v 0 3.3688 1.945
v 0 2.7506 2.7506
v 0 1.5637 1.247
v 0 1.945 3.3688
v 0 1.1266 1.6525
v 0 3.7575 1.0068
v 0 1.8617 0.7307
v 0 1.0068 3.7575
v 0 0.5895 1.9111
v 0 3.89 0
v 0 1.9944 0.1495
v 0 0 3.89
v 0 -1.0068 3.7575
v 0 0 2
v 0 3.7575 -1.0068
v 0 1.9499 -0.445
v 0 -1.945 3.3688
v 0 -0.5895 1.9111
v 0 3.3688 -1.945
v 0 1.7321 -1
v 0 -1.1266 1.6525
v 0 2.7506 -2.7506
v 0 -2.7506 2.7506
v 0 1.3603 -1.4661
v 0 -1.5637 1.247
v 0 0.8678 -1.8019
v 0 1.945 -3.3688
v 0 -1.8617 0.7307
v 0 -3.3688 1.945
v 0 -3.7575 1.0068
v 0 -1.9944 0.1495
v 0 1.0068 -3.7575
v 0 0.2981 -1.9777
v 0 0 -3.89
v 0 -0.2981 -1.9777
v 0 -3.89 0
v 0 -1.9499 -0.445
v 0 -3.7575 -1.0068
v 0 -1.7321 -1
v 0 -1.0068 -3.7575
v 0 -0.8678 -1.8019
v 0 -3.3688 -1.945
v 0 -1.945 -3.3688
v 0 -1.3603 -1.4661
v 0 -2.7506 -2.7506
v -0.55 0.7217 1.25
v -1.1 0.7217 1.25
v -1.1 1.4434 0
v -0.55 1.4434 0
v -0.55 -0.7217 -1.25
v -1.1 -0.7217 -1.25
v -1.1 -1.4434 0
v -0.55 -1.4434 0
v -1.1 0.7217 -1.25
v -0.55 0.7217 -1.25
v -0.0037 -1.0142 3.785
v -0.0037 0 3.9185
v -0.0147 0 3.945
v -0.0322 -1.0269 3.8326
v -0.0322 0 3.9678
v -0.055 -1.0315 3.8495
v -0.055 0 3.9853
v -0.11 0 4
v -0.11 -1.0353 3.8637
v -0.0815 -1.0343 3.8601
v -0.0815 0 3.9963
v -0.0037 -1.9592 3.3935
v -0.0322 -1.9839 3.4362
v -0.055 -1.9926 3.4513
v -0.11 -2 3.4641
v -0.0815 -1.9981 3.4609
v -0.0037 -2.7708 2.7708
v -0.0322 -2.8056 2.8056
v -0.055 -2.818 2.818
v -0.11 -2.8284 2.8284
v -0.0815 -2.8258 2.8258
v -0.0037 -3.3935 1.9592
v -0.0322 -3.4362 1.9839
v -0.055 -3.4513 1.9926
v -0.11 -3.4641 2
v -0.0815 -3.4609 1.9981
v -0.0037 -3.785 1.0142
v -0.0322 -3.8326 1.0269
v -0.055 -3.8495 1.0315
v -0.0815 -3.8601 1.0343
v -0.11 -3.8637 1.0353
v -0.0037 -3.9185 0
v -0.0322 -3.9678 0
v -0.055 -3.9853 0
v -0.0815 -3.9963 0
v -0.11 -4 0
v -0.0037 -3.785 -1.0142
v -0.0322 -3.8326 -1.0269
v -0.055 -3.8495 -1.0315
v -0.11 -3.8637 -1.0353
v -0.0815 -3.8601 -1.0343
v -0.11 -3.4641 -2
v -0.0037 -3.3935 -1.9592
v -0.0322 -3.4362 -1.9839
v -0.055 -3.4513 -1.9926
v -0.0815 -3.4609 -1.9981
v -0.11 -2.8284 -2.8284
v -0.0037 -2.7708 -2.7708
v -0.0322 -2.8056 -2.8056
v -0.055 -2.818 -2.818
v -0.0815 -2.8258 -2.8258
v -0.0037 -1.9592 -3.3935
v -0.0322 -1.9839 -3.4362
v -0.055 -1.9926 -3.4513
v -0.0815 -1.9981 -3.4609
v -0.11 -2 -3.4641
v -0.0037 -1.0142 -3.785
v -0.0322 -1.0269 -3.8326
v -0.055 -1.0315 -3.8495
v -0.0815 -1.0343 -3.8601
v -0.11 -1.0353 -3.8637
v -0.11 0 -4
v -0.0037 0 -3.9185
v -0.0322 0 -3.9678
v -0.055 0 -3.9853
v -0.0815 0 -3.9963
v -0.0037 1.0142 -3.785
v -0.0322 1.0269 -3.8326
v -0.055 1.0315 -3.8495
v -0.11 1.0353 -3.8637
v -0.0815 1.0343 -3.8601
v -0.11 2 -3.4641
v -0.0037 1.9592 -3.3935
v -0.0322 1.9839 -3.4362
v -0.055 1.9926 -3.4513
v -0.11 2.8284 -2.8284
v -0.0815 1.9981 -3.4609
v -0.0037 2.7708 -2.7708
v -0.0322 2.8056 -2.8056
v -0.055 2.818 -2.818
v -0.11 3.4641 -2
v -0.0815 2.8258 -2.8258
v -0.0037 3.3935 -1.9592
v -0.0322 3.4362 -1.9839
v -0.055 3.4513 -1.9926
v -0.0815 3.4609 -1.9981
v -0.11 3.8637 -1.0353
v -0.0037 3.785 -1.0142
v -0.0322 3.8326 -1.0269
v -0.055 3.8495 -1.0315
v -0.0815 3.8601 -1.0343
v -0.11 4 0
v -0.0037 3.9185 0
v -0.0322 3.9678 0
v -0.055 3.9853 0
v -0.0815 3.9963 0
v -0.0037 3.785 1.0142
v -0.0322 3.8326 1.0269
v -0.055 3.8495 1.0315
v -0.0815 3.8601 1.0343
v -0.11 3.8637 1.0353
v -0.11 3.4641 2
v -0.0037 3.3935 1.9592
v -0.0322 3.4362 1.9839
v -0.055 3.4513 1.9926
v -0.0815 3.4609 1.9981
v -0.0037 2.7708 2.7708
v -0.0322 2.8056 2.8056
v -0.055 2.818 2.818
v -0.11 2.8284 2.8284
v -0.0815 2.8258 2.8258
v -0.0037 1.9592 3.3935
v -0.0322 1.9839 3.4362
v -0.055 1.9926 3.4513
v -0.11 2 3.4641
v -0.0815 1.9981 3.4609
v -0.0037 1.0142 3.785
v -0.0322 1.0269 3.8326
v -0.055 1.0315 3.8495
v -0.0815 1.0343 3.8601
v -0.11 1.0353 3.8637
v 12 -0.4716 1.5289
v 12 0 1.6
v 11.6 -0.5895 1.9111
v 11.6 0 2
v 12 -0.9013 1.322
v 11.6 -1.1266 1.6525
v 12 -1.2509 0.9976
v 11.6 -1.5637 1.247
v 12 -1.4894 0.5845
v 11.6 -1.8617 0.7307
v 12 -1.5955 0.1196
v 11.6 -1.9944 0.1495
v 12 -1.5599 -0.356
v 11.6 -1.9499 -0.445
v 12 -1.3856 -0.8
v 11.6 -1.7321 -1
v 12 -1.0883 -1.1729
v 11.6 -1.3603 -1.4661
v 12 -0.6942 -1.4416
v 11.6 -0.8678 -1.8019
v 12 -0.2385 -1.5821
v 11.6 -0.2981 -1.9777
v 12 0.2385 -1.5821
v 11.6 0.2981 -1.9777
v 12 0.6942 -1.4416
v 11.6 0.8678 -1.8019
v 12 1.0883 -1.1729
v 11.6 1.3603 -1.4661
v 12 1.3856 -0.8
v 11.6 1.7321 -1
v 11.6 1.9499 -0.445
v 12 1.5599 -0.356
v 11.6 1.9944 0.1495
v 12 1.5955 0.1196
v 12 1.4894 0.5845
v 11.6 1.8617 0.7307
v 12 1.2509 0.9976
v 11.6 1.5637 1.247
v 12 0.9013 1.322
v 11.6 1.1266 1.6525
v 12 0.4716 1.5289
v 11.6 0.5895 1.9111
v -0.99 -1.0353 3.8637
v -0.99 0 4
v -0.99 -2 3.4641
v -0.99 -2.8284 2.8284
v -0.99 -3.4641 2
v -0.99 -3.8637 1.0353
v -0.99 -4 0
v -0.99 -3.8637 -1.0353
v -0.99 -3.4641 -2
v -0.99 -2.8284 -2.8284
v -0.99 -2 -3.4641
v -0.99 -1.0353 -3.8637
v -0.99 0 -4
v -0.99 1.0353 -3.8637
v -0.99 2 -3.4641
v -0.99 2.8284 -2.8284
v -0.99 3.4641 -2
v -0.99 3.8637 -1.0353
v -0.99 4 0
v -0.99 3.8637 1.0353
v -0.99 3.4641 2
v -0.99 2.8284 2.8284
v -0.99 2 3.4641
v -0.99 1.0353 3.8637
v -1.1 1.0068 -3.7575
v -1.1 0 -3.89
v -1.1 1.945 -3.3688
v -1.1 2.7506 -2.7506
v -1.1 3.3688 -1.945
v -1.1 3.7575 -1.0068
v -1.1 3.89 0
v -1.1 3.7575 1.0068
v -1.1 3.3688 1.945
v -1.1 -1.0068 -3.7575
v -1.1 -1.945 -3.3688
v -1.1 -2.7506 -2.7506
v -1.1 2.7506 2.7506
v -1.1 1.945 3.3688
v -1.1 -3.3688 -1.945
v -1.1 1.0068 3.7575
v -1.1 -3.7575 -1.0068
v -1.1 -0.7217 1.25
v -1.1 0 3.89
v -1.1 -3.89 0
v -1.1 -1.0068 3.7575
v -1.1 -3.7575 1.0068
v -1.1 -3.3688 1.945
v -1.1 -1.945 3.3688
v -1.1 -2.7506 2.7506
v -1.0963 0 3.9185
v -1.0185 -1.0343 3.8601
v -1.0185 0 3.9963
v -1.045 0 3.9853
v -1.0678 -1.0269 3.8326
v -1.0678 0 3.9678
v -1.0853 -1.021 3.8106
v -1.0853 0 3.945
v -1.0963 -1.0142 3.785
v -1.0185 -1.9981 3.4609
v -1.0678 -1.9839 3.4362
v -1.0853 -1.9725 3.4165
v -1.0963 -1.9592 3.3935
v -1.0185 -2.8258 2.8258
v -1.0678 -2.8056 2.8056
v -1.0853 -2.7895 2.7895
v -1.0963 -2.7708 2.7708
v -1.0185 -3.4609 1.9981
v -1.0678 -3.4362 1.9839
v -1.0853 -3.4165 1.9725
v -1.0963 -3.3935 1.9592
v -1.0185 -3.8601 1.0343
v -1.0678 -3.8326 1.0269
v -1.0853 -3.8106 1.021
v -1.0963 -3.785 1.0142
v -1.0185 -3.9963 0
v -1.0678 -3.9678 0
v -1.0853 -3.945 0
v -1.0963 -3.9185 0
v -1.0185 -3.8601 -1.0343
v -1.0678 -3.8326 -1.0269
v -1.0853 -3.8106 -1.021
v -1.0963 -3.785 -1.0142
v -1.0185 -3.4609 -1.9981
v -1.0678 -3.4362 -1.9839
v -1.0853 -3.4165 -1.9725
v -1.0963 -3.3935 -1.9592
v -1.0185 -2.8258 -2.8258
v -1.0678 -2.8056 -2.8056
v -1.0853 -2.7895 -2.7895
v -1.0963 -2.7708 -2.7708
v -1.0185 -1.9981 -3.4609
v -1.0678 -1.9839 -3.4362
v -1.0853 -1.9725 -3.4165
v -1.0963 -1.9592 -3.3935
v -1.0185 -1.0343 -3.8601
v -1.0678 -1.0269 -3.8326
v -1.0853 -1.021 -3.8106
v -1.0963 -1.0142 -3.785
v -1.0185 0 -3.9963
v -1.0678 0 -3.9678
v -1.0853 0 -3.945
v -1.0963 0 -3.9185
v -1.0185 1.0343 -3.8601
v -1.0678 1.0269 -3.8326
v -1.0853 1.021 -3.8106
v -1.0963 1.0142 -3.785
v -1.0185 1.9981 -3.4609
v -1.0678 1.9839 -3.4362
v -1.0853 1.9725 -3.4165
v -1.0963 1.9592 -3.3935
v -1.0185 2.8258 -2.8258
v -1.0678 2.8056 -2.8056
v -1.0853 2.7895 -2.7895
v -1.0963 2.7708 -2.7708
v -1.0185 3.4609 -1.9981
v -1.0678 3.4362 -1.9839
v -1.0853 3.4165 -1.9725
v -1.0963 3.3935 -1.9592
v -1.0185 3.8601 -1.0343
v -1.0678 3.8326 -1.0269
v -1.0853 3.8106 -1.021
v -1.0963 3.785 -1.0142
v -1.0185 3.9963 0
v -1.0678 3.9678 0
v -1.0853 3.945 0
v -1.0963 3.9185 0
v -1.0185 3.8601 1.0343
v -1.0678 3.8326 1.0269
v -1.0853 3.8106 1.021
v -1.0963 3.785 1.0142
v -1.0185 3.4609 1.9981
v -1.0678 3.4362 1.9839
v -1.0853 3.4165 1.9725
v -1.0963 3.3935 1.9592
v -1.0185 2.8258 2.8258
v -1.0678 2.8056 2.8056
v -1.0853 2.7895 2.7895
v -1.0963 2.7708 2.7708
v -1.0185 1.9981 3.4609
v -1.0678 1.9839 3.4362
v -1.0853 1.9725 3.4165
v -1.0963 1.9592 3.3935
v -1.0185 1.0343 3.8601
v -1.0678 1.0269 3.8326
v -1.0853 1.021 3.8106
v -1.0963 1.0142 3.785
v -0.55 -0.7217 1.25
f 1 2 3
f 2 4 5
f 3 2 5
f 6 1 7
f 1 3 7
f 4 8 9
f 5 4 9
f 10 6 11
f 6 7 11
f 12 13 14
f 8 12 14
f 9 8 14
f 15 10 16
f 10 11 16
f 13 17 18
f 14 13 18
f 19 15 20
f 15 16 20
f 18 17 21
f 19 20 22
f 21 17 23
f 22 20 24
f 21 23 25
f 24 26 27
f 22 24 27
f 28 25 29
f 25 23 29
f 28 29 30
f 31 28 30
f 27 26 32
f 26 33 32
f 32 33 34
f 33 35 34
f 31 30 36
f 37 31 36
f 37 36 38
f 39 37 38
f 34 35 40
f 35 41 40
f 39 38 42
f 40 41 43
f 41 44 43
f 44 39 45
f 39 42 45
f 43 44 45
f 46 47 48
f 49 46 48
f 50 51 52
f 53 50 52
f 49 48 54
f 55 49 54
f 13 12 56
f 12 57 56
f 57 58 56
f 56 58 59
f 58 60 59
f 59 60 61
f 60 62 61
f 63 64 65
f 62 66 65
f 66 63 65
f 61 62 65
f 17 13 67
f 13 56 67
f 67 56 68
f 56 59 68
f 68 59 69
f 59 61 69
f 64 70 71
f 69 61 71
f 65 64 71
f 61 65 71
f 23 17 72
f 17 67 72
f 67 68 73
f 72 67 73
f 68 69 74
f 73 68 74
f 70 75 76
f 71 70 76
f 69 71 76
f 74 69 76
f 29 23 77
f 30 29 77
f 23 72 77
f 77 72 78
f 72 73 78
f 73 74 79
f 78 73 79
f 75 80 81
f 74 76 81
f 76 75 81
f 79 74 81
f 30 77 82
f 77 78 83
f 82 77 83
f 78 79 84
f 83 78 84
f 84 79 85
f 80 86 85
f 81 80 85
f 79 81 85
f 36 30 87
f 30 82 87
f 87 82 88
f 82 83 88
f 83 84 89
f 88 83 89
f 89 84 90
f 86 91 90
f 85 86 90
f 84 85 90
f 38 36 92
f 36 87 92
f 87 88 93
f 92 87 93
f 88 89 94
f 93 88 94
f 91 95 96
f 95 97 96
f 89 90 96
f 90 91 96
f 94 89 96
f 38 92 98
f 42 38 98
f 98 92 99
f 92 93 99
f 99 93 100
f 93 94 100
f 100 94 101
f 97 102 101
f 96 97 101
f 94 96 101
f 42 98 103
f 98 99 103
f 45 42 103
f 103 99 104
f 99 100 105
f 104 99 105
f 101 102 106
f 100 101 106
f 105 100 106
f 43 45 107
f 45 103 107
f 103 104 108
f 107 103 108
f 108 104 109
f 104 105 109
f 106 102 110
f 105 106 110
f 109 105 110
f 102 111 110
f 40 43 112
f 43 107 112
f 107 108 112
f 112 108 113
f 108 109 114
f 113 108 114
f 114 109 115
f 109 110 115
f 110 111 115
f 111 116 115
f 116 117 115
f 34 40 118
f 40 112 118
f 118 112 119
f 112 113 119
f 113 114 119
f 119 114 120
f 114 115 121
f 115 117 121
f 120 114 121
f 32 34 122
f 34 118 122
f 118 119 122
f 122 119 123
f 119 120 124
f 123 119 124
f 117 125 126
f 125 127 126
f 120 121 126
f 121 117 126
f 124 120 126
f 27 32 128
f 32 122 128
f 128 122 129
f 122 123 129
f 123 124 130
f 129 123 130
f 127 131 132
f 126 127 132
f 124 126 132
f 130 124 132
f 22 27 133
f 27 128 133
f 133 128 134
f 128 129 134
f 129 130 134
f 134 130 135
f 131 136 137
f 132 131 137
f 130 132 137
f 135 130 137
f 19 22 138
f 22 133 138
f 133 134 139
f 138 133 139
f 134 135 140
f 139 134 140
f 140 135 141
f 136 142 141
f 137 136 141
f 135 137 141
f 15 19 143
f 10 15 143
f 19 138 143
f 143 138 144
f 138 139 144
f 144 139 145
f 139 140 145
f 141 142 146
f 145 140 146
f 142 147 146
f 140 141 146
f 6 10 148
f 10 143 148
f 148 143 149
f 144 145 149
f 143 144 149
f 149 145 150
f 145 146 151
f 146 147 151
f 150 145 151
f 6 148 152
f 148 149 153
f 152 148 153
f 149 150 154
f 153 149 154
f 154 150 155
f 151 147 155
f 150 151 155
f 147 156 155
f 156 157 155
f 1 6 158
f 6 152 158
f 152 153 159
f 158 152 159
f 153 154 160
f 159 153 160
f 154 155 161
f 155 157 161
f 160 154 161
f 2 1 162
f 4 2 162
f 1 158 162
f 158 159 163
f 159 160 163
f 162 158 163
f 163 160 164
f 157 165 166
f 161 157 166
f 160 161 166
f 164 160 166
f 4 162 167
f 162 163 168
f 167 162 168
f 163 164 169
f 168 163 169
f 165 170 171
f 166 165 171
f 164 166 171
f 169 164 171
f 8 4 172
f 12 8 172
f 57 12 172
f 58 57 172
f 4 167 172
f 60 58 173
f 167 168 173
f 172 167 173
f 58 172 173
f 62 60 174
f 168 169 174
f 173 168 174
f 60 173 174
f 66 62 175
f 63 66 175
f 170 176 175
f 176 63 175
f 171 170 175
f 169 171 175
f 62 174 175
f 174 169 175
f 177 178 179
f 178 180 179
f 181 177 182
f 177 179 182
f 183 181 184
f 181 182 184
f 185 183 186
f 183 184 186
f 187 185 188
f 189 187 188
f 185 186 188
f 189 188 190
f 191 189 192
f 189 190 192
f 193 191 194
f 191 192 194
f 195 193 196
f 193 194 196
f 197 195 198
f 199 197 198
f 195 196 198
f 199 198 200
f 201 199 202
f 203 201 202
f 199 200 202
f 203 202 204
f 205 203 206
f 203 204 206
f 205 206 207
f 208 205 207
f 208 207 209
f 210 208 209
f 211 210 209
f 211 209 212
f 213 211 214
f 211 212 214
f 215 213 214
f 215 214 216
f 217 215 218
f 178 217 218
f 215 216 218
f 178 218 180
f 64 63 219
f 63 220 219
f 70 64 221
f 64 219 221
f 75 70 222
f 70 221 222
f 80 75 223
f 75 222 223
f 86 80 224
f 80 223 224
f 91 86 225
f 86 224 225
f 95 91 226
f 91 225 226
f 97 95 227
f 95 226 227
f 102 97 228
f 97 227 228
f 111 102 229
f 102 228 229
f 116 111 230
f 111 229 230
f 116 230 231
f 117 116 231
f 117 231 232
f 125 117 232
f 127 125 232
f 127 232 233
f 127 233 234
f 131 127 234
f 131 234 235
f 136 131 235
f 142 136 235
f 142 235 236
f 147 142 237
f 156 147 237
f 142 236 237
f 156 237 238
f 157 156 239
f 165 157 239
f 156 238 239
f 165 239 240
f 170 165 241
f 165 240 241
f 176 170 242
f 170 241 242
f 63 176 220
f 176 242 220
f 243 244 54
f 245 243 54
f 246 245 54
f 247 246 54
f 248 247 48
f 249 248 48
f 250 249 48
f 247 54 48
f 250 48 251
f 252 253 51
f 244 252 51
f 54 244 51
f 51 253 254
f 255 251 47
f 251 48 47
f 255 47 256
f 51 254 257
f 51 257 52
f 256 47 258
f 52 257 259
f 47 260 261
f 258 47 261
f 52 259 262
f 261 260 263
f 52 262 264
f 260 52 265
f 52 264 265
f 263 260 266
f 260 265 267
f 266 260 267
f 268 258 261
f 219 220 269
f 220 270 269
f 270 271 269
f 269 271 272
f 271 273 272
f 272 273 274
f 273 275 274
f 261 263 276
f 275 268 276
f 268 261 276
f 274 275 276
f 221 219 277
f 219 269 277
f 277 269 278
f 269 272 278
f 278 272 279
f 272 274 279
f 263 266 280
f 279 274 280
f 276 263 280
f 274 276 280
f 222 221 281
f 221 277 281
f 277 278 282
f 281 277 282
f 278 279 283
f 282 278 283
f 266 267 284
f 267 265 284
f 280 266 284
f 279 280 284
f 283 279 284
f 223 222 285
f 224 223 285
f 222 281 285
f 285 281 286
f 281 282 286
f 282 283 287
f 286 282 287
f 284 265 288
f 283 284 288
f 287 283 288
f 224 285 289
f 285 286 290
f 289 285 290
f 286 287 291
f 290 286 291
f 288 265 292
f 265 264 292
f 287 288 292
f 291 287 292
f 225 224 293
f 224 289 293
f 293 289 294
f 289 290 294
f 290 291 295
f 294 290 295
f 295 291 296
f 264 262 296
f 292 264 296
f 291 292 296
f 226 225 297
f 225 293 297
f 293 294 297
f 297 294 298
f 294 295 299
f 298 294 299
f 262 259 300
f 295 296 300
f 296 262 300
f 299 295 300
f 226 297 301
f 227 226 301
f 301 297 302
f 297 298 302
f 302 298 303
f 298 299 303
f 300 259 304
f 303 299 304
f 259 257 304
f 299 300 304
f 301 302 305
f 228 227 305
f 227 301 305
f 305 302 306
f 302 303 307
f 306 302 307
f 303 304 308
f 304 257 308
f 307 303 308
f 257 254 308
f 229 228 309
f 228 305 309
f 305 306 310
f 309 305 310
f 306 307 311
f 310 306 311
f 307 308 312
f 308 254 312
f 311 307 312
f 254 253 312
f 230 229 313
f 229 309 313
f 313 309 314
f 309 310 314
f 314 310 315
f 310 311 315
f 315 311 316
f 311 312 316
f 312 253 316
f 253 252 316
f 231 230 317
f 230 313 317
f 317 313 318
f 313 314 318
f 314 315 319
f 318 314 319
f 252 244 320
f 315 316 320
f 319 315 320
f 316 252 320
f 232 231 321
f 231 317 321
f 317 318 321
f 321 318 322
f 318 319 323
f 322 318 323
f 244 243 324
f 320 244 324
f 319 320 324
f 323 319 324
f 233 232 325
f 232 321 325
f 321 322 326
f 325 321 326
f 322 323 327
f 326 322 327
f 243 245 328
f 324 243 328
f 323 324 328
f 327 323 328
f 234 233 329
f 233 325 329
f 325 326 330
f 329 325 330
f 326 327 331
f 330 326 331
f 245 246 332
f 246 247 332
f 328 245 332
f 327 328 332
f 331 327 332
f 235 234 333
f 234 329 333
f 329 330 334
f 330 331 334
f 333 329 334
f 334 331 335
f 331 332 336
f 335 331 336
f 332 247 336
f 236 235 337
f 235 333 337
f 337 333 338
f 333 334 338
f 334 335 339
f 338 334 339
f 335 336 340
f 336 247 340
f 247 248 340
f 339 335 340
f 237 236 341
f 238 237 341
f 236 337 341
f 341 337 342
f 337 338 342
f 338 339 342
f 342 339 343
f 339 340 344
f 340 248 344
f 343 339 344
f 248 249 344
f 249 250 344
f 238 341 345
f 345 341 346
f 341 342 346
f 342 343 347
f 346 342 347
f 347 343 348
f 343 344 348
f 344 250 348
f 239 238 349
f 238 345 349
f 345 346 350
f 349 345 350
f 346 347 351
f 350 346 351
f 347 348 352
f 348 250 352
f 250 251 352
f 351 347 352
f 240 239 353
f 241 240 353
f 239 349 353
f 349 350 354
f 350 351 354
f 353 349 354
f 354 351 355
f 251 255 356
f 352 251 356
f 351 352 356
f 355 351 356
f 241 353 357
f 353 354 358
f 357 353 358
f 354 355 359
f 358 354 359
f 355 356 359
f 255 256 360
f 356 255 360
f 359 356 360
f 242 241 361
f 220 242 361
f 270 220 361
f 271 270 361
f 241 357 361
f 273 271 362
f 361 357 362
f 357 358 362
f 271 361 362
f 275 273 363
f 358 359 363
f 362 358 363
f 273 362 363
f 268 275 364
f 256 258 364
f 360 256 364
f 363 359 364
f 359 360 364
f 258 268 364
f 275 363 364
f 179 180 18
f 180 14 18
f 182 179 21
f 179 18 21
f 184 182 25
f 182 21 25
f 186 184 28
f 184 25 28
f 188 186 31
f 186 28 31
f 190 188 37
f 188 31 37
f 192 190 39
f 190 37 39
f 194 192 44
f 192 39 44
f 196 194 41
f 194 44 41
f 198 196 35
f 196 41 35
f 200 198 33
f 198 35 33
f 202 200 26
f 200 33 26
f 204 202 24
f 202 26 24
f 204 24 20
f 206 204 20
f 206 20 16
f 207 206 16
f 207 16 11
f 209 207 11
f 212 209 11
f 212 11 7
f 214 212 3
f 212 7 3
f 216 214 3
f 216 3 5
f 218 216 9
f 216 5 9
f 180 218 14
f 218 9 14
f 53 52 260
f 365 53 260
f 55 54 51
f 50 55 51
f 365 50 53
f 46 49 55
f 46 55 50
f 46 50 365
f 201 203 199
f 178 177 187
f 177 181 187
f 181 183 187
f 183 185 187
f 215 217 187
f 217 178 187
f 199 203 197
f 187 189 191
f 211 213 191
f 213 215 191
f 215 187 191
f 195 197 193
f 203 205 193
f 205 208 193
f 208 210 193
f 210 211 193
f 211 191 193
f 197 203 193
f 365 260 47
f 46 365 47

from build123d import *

# Parameters (mm, degrees)
CUT_EXTRUDE_1_DEPTH = 0.55


with BuildPart() as part:
    # 草图1 → 旋转1 (revolve)
    with BuildSketch(Plane.XY, mode=Mode.PRIVATE) as revolve_1_sk:
        Polygon((12, 1.6), (11.6, 2), (0, 2), (0, 0), (12, 0), align=None)
        with BuildLine():
            Line((-0.11, 4), (-0.99, 4))
            ThreePointArc((-0.99, 4), (-1.067781746, 3.967781746), (-1.1, 3.89))
            Line((-1.1, 3.89), (-1.1, 0))
            Line((-1.1, 0), (0, 0))
            Line((0, 0), (0, 3.89))
            ThreePointArc((0, 3.89), (-0.032218254, 3.967781746), (-0.11, 4))
        make_face()
    revolve(revolve_1_sk.sketch.rotate(Axis((0, 0, 0), (1, 0, 0)), 90), axis=Axis((0, 0, 0), (1, 0, 0)))

    # 草图2 → 切除-拉伸1 (cut)
    with BuildSketch(Plane.ZY.offset(1.1)):
        Polygon((1.25, -0.721687836), (1.25, 0.721687836), (0, 1.443375673), (-1.25, 0.721687836), (-1.25, -0.721687836), (0, -1.443375673), align=None)
    extrude(amount=-CUT_EXTRUDE_1_DEPTH, mode=Mode.SUBTRACT)


solid = part.part
